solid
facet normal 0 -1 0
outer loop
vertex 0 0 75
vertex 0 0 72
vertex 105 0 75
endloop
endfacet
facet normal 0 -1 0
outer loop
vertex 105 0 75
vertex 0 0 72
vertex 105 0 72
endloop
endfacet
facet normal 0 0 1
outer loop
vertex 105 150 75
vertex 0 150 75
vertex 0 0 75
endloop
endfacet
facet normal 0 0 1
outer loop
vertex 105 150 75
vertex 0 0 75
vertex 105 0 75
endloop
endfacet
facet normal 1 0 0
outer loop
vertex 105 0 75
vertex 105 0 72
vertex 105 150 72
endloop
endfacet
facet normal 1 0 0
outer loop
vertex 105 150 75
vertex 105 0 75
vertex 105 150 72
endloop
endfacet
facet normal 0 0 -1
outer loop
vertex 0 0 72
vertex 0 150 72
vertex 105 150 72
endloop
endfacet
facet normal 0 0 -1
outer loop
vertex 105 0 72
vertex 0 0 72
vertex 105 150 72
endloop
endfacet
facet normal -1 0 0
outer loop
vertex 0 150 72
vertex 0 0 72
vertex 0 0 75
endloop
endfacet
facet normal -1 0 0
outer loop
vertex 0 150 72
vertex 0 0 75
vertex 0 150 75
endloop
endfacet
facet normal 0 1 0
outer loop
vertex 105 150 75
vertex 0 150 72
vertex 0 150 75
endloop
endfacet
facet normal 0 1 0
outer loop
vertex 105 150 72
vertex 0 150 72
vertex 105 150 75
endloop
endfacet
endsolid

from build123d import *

# Parameters (mm, degrees)
BOX004_W     = 100
BOX004_H     = 145
BOX004_DEPTH = 70
BOX005_W     = 105
BOX005_H     = 150
BOX005_DEPTH = 3


with BuildPart() as cubo004:
    # Box004 → Box004 (new body)
    with BuildSketch(Plane(origin=(2.5, 2.5, 3), x_dir=(1, 0, 0), z_dir=(0, 0, 1))):
        with Locations((50, 72.5)):
            Rectangle(BOX004_W, BOX004_H)
    extrude(amount=BOX004_DEPTH)


with BuildPart() as caja002:
    # Box005 → Box005 (new body)
    with BuildSketch(Plane.XY):
        with Locations((52.5, 75)):
            Rectangle(BOX005_W, BOX005_H)
    extrude(amount=BOX005_DEPTH)

    # Cut007: cut Cubo004
    add(cubo004.part, mode=Mode.SUBTRACT)


with BuildPart() as caja002_1:
    # Cut007 placement: moved
    add(caja002.part.moved(Location((0, 0, 72))))


solid = caja002_1.part
